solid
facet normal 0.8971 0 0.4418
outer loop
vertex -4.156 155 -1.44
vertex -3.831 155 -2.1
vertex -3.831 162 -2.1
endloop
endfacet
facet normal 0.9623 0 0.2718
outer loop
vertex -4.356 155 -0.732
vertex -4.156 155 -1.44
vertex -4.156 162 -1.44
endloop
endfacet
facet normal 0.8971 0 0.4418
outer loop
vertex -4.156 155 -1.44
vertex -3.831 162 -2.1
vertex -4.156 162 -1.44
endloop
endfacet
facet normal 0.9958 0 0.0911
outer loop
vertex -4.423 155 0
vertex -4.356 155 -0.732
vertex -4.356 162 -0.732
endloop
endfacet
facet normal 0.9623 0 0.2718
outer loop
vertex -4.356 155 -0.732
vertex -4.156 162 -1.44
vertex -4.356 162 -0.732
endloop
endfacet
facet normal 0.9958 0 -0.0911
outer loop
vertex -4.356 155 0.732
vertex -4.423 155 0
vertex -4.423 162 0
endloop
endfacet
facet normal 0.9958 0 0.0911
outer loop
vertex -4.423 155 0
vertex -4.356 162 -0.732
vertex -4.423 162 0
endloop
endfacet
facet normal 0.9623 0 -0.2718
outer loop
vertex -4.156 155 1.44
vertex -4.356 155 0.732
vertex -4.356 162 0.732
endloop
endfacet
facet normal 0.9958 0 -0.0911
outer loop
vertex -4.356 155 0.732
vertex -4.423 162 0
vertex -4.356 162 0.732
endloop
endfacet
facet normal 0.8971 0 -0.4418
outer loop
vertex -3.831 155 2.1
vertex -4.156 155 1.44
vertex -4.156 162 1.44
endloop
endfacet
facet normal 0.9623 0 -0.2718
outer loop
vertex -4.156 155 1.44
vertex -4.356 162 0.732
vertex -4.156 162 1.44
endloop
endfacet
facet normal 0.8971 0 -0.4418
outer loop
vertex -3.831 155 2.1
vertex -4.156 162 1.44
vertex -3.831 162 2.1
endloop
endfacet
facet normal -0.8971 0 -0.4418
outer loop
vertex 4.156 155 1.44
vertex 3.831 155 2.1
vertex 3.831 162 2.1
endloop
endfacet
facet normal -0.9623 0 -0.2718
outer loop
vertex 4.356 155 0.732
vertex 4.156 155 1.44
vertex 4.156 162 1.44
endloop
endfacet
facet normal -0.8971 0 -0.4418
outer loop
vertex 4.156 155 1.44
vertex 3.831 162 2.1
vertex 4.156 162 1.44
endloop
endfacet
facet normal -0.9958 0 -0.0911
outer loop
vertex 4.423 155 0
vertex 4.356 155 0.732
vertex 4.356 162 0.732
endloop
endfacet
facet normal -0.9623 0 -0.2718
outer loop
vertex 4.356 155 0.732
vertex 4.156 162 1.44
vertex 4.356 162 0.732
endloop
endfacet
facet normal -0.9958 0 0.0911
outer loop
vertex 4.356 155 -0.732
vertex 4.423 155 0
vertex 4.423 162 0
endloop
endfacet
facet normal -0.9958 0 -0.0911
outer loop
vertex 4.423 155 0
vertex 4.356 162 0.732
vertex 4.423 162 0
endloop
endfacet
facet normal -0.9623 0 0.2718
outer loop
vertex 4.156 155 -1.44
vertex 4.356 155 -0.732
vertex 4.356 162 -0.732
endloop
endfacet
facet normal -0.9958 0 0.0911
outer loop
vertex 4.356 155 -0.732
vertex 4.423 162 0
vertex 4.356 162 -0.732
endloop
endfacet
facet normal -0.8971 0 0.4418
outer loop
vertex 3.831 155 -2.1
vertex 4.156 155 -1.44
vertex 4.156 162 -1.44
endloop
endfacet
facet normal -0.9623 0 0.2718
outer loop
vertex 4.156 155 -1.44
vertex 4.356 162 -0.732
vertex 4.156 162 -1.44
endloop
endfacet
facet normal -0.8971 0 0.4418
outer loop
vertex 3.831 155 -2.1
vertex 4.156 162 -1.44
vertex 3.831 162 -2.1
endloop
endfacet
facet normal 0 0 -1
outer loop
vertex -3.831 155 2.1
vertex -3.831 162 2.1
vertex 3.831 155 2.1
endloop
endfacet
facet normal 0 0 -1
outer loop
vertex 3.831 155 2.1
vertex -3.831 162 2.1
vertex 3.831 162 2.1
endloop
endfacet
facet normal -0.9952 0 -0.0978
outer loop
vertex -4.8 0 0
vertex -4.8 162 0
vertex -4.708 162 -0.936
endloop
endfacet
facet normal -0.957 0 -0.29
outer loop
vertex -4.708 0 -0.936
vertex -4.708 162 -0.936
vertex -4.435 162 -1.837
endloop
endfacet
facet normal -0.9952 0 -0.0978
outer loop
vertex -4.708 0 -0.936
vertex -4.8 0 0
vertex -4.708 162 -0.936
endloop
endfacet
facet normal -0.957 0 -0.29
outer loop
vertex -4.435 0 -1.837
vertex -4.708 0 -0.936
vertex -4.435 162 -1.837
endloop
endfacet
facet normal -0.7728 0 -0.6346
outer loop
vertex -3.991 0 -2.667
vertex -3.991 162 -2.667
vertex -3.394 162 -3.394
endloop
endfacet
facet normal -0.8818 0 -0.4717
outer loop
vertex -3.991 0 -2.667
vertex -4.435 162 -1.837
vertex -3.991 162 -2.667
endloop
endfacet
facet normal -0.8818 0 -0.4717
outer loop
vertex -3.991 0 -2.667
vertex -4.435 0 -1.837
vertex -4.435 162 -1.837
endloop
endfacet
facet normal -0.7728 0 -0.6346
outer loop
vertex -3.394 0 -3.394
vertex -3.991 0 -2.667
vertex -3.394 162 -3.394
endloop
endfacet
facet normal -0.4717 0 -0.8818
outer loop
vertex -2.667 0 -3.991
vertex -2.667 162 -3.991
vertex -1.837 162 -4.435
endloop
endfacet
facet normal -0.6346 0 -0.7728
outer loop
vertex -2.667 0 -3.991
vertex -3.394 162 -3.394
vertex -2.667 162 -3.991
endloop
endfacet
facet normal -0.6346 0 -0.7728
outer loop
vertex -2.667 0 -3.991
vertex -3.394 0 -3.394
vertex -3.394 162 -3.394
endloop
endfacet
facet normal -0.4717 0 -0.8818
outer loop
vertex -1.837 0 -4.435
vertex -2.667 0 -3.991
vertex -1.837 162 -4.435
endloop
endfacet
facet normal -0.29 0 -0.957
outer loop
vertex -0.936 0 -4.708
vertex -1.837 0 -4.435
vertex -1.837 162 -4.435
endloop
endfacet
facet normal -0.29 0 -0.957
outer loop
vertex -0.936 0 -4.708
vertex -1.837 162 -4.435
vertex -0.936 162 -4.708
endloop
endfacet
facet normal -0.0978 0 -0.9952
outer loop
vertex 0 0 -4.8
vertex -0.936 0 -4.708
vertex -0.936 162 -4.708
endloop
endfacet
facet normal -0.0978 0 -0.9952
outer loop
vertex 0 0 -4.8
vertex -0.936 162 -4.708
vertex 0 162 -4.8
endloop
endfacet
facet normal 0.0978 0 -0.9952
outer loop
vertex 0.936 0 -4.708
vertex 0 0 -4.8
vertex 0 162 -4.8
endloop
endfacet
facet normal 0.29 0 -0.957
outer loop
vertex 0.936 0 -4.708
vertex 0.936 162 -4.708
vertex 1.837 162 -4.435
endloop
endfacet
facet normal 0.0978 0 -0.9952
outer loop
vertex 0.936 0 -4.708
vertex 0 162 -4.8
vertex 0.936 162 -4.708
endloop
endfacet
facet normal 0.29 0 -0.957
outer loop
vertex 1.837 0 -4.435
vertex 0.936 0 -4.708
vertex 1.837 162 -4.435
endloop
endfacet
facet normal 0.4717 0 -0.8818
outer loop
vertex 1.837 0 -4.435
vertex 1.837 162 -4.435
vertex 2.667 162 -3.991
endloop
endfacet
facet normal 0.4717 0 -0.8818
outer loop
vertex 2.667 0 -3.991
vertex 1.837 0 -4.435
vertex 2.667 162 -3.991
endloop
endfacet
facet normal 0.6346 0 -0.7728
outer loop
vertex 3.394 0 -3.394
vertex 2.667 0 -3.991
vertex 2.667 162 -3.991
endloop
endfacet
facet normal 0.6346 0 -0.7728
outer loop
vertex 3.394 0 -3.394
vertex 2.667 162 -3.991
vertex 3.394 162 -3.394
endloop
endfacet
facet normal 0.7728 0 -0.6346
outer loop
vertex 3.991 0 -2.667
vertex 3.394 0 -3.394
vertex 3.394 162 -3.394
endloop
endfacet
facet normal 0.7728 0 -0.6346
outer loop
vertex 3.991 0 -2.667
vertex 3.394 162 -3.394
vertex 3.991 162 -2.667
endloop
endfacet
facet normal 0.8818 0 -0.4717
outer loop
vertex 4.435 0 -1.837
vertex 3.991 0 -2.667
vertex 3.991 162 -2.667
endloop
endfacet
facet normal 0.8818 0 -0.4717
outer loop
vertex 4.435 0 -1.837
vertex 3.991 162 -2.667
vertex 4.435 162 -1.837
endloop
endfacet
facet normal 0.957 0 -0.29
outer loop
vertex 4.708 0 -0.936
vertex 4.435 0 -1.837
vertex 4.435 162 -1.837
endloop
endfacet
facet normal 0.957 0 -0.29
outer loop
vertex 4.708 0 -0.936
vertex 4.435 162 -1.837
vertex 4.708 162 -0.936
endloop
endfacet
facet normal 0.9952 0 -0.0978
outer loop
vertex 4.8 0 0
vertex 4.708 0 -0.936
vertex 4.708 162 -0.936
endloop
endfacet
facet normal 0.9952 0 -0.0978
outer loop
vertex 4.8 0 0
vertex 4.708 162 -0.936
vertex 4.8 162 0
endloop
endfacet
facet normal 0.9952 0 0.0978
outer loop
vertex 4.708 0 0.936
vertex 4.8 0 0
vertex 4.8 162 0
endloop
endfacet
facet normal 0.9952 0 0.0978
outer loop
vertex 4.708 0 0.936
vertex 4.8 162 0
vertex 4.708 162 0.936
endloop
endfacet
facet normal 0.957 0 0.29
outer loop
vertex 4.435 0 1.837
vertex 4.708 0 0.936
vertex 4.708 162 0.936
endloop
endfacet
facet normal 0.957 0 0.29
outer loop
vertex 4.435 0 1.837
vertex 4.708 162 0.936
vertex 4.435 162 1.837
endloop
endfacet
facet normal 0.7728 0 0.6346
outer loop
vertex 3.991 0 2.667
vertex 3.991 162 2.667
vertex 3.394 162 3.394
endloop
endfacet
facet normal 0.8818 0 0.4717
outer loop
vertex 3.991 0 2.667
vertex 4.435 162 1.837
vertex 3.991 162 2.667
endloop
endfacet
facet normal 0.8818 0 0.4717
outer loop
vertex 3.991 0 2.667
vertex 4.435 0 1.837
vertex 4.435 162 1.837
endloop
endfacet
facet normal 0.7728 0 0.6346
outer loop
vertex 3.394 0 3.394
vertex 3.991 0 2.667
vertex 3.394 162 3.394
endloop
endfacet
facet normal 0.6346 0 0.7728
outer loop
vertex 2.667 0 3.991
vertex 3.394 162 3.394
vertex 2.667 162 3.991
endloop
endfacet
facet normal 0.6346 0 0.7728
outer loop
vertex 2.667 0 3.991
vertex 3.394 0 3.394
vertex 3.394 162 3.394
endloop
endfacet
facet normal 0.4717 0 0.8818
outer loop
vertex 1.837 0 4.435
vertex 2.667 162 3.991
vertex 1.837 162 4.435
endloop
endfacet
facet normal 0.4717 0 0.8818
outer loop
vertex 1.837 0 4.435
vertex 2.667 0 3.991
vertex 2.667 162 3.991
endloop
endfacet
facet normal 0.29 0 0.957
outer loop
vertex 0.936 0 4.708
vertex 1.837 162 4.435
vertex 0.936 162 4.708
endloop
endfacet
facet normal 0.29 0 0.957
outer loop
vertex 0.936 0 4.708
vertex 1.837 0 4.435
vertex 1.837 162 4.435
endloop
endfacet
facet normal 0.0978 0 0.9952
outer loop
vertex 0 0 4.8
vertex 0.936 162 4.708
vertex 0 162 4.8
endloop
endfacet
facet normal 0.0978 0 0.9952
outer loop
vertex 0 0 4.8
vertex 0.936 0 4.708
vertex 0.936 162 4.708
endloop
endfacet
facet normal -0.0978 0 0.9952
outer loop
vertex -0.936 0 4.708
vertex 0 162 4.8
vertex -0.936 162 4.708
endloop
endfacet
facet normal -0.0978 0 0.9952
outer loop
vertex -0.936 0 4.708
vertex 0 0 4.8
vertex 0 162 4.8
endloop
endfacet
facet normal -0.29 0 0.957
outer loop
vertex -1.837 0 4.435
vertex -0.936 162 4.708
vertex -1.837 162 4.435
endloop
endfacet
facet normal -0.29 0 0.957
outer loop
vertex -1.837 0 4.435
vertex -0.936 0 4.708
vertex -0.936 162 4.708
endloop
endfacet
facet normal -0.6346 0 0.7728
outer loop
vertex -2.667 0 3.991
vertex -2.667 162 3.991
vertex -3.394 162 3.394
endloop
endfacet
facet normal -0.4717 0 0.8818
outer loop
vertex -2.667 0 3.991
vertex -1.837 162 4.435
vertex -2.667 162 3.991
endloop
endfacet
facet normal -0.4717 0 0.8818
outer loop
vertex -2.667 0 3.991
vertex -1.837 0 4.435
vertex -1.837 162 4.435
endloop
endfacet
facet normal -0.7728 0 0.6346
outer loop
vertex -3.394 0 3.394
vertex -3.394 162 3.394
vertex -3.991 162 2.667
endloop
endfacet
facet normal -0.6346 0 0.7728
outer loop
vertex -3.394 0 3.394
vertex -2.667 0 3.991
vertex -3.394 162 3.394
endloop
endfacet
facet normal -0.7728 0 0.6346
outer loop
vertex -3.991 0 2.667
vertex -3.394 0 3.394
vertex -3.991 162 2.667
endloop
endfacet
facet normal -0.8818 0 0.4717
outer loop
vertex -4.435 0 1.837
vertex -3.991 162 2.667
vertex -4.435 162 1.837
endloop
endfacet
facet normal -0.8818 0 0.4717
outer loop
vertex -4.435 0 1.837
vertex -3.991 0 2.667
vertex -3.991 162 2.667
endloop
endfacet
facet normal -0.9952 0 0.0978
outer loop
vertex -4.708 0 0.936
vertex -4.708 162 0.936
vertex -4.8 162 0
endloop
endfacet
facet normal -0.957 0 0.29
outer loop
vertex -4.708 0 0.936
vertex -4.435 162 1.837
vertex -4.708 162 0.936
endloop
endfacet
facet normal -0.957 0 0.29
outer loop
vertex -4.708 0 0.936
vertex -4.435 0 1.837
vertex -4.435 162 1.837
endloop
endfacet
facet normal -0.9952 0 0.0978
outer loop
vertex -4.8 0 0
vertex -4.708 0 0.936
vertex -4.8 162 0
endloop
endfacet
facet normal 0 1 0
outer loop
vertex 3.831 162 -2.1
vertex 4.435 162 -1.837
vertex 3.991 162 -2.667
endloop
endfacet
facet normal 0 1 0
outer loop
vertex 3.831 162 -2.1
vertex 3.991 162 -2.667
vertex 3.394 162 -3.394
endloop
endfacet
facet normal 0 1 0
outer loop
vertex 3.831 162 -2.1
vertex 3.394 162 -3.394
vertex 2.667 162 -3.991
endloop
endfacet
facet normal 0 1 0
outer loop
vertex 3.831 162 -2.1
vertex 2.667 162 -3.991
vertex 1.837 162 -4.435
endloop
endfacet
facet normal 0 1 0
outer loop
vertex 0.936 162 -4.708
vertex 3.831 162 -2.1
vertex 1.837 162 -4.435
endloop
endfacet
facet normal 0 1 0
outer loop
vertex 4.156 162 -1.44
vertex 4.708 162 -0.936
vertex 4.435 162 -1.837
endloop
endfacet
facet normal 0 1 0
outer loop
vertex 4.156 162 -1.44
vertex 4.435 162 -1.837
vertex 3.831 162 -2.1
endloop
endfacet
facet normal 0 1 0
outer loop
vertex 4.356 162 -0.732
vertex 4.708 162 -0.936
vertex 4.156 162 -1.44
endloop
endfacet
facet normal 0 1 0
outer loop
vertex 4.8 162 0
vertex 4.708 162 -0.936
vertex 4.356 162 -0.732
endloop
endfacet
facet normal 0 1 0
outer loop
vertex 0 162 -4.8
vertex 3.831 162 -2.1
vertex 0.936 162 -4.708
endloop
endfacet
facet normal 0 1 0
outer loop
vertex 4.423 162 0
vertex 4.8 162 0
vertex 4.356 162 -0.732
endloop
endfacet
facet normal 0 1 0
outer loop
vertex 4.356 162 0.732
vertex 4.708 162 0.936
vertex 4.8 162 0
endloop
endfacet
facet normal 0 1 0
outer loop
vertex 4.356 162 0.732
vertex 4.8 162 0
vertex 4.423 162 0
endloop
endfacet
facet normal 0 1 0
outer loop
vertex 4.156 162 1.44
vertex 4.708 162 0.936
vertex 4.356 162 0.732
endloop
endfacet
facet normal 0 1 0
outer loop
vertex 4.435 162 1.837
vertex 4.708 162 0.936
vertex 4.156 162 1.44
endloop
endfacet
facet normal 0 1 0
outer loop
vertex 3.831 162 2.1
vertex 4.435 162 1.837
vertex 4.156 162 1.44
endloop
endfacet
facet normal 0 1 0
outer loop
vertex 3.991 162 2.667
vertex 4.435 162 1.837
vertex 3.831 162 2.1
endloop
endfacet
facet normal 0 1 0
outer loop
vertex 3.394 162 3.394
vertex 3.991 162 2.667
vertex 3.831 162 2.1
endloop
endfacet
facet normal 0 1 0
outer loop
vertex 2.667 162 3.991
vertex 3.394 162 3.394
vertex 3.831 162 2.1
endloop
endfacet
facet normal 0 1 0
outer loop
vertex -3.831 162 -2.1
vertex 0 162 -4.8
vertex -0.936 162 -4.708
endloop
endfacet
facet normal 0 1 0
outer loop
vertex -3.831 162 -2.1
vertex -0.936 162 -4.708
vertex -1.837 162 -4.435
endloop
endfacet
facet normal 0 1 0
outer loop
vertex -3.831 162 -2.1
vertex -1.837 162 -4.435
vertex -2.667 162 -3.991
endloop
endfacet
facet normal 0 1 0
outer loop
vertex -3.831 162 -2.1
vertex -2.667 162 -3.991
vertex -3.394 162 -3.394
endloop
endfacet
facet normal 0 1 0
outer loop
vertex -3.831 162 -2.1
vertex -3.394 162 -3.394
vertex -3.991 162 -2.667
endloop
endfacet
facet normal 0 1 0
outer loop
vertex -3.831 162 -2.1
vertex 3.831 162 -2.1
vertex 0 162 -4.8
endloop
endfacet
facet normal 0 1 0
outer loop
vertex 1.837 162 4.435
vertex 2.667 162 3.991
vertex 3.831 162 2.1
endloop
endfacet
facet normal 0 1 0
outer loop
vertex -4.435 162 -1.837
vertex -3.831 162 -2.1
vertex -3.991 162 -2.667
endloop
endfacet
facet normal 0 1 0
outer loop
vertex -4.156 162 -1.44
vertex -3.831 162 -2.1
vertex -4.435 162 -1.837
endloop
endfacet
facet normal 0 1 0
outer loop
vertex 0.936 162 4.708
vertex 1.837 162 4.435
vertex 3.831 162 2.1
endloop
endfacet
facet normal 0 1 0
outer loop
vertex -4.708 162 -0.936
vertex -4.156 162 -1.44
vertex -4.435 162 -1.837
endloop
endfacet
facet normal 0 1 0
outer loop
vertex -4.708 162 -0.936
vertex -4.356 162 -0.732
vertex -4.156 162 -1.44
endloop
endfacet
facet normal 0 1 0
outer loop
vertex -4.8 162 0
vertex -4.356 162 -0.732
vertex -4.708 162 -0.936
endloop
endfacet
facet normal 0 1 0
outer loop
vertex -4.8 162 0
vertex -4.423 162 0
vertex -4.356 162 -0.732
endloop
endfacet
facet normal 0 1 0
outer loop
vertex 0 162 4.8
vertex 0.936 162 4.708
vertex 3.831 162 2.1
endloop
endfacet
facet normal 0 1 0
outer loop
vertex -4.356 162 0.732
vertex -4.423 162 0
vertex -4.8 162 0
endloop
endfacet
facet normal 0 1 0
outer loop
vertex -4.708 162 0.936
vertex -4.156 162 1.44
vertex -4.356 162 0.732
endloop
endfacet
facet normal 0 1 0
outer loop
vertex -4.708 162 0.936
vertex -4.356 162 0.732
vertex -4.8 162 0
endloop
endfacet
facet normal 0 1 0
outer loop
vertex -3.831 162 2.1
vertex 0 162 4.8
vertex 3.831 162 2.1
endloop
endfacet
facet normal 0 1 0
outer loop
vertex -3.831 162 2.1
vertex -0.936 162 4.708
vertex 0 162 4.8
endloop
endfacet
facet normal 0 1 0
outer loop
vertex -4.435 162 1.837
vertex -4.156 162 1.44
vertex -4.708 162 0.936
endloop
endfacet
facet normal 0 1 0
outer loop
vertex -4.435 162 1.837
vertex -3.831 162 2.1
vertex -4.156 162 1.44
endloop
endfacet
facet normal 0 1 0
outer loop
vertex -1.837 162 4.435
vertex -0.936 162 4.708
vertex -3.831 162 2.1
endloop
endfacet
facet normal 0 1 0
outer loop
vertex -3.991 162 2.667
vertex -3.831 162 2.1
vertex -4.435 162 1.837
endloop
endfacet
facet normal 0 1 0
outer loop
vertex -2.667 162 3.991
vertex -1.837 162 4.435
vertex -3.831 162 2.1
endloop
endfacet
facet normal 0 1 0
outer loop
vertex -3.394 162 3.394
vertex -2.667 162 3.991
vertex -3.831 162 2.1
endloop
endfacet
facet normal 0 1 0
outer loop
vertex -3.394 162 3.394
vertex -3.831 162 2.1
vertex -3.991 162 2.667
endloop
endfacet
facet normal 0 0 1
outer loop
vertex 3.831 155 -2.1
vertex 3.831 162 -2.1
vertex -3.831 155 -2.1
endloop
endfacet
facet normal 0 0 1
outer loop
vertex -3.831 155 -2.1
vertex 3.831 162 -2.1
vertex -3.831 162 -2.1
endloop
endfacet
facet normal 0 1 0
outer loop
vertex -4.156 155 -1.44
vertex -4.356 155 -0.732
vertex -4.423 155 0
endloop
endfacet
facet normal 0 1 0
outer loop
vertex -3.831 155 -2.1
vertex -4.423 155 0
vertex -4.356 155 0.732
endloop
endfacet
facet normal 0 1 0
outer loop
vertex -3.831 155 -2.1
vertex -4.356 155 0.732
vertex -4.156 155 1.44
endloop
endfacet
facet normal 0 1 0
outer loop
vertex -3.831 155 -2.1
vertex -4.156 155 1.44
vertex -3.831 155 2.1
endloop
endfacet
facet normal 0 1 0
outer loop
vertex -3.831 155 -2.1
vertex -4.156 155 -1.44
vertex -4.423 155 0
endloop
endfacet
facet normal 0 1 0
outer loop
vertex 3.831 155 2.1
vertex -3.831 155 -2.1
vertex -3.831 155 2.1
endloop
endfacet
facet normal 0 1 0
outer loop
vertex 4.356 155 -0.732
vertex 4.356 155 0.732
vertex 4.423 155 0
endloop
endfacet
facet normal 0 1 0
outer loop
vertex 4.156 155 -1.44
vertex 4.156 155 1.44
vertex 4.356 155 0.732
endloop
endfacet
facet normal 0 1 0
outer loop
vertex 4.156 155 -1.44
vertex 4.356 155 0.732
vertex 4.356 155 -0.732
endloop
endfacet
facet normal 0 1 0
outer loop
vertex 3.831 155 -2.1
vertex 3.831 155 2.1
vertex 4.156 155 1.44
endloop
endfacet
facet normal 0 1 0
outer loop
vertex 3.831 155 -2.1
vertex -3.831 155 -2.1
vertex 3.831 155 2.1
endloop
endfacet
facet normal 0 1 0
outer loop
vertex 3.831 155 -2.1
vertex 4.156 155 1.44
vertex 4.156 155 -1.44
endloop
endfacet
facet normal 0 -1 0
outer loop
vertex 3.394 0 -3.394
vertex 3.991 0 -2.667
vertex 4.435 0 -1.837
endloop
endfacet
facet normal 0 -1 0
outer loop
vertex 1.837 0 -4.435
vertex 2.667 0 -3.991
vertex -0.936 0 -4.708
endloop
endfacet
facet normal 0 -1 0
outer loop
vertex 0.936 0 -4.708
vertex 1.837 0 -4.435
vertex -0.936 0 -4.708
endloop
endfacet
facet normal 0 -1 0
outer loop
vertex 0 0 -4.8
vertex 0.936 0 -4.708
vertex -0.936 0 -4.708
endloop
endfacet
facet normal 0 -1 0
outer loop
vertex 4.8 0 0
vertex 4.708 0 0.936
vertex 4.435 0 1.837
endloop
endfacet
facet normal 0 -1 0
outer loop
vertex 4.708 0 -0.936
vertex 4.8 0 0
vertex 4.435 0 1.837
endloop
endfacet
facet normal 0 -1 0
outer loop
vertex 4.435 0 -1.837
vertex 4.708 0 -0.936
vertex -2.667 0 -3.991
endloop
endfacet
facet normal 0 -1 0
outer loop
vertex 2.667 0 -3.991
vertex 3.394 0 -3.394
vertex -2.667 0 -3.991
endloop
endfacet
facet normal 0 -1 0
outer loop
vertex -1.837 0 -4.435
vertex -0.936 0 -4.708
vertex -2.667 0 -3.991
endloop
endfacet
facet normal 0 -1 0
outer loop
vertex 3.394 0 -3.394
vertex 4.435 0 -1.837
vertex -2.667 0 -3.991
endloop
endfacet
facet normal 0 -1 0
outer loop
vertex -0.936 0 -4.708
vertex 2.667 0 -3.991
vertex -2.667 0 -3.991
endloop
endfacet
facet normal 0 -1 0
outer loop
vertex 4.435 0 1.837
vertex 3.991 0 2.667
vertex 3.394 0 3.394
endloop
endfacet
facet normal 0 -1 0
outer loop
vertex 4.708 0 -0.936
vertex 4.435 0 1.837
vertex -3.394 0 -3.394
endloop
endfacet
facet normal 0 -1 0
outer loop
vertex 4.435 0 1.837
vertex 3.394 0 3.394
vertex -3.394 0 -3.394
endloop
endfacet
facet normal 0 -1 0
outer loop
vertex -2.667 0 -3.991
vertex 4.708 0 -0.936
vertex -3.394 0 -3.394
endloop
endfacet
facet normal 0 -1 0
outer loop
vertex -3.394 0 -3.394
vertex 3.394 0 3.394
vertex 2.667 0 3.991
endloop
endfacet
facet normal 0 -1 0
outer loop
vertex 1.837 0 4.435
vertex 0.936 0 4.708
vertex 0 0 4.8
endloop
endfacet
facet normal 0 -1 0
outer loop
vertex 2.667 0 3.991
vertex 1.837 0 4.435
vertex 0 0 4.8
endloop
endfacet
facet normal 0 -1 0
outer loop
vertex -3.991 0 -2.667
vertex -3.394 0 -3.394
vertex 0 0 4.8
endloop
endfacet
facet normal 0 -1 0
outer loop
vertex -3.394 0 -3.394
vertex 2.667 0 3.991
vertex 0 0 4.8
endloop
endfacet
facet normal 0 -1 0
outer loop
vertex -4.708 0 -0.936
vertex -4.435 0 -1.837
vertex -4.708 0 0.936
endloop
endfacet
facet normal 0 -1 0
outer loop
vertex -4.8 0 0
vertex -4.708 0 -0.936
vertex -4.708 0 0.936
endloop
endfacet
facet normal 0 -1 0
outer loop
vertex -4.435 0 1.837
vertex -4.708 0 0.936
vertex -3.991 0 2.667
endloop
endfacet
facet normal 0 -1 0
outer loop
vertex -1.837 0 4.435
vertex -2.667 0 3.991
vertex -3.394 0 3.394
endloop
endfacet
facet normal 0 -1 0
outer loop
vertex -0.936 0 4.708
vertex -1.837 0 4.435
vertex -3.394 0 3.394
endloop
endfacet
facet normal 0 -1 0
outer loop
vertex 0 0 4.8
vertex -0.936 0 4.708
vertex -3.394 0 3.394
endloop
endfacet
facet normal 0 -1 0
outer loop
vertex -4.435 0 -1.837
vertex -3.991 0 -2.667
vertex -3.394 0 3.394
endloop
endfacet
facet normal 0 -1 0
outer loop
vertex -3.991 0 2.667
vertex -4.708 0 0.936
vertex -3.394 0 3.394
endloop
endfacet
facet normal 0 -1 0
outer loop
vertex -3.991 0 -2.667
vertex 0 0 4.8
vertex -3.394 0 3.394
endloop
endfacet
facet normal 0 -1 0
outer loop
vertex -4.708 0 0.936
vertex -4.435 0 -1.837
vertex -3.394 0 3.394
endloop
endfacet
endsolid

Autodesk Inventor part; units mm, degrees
ref_plane "YZ Plane" through (0, 0, 0) normal (1, 0, 0) x (0, 1, 0)
ref_plane "XZ Plane" through (0, 0, 0) normal (0, 1, 0) x (-1, 0, 0)
ref_plane "XY Plane" through (0, 0, 0) normal (0, 0, 1) x (1, 0, 0)
sketch "Sketch1" plane through (0, 0, 0) normal (0, 1, 0) x (-1, 0, 0)
  circle A0 centre (0, 0) radius 4.8
  dimension "d0" = 9.6
extrude "Extrusion1" add sketch "Sketch1" along normal blind 162
sketch "Sketch2" plane through (0, 162, 0) normal (0, 1, 0) x (1, 0, 0)
  line L0 (-3.8312, -2.1) -> (3.8312, -2.1)
  line L1 (3.8312, -2.1) -> (3.8312, 2.1)
  line L2 (3.8312, 2.1) -> (-3.8312, 2.1)
  line L3 (-3.8312, 2.1) -> (-3.8312, -2.1)
  line L4 (-3.8312, -2.1) -> (3.8312, 2.1) construction
  line L5 (3.8312, -2.1) -> (-3.8312, 2.1) construction
  arc A0 (-3.8312, 2.1) -> (-3.8312, -2.1) centre (-0.4025, 0) ccw
  line L6 (-4.4232, 0) -> (-3.8312, 0)
  line L7 (3.8312, 0) -> (4.4232, 0)
  arc A1 (3.8312, -2.1) -> (3.8312, 2.1) centre (0.4025, 0) ccw
  circle A2 centre (0, 0) radius 4.8 projected
  line L8 (-4.8, 0) -> (-4.4232, 0)
  line L9 (4.4232, 0) -> (4.8, 0)
  dimension "d3" = 0.592
  dimension "d6" = 4.2
extrude "Extrusion2" cut sketch "Sketch2" against normal blind 7 contours L3 L2 L1 L0 | A0 L6 L3 | L1 L7 A1 | L6 A0 L3 | L1 A1 L7
properties part number "Lifting Shaft"
